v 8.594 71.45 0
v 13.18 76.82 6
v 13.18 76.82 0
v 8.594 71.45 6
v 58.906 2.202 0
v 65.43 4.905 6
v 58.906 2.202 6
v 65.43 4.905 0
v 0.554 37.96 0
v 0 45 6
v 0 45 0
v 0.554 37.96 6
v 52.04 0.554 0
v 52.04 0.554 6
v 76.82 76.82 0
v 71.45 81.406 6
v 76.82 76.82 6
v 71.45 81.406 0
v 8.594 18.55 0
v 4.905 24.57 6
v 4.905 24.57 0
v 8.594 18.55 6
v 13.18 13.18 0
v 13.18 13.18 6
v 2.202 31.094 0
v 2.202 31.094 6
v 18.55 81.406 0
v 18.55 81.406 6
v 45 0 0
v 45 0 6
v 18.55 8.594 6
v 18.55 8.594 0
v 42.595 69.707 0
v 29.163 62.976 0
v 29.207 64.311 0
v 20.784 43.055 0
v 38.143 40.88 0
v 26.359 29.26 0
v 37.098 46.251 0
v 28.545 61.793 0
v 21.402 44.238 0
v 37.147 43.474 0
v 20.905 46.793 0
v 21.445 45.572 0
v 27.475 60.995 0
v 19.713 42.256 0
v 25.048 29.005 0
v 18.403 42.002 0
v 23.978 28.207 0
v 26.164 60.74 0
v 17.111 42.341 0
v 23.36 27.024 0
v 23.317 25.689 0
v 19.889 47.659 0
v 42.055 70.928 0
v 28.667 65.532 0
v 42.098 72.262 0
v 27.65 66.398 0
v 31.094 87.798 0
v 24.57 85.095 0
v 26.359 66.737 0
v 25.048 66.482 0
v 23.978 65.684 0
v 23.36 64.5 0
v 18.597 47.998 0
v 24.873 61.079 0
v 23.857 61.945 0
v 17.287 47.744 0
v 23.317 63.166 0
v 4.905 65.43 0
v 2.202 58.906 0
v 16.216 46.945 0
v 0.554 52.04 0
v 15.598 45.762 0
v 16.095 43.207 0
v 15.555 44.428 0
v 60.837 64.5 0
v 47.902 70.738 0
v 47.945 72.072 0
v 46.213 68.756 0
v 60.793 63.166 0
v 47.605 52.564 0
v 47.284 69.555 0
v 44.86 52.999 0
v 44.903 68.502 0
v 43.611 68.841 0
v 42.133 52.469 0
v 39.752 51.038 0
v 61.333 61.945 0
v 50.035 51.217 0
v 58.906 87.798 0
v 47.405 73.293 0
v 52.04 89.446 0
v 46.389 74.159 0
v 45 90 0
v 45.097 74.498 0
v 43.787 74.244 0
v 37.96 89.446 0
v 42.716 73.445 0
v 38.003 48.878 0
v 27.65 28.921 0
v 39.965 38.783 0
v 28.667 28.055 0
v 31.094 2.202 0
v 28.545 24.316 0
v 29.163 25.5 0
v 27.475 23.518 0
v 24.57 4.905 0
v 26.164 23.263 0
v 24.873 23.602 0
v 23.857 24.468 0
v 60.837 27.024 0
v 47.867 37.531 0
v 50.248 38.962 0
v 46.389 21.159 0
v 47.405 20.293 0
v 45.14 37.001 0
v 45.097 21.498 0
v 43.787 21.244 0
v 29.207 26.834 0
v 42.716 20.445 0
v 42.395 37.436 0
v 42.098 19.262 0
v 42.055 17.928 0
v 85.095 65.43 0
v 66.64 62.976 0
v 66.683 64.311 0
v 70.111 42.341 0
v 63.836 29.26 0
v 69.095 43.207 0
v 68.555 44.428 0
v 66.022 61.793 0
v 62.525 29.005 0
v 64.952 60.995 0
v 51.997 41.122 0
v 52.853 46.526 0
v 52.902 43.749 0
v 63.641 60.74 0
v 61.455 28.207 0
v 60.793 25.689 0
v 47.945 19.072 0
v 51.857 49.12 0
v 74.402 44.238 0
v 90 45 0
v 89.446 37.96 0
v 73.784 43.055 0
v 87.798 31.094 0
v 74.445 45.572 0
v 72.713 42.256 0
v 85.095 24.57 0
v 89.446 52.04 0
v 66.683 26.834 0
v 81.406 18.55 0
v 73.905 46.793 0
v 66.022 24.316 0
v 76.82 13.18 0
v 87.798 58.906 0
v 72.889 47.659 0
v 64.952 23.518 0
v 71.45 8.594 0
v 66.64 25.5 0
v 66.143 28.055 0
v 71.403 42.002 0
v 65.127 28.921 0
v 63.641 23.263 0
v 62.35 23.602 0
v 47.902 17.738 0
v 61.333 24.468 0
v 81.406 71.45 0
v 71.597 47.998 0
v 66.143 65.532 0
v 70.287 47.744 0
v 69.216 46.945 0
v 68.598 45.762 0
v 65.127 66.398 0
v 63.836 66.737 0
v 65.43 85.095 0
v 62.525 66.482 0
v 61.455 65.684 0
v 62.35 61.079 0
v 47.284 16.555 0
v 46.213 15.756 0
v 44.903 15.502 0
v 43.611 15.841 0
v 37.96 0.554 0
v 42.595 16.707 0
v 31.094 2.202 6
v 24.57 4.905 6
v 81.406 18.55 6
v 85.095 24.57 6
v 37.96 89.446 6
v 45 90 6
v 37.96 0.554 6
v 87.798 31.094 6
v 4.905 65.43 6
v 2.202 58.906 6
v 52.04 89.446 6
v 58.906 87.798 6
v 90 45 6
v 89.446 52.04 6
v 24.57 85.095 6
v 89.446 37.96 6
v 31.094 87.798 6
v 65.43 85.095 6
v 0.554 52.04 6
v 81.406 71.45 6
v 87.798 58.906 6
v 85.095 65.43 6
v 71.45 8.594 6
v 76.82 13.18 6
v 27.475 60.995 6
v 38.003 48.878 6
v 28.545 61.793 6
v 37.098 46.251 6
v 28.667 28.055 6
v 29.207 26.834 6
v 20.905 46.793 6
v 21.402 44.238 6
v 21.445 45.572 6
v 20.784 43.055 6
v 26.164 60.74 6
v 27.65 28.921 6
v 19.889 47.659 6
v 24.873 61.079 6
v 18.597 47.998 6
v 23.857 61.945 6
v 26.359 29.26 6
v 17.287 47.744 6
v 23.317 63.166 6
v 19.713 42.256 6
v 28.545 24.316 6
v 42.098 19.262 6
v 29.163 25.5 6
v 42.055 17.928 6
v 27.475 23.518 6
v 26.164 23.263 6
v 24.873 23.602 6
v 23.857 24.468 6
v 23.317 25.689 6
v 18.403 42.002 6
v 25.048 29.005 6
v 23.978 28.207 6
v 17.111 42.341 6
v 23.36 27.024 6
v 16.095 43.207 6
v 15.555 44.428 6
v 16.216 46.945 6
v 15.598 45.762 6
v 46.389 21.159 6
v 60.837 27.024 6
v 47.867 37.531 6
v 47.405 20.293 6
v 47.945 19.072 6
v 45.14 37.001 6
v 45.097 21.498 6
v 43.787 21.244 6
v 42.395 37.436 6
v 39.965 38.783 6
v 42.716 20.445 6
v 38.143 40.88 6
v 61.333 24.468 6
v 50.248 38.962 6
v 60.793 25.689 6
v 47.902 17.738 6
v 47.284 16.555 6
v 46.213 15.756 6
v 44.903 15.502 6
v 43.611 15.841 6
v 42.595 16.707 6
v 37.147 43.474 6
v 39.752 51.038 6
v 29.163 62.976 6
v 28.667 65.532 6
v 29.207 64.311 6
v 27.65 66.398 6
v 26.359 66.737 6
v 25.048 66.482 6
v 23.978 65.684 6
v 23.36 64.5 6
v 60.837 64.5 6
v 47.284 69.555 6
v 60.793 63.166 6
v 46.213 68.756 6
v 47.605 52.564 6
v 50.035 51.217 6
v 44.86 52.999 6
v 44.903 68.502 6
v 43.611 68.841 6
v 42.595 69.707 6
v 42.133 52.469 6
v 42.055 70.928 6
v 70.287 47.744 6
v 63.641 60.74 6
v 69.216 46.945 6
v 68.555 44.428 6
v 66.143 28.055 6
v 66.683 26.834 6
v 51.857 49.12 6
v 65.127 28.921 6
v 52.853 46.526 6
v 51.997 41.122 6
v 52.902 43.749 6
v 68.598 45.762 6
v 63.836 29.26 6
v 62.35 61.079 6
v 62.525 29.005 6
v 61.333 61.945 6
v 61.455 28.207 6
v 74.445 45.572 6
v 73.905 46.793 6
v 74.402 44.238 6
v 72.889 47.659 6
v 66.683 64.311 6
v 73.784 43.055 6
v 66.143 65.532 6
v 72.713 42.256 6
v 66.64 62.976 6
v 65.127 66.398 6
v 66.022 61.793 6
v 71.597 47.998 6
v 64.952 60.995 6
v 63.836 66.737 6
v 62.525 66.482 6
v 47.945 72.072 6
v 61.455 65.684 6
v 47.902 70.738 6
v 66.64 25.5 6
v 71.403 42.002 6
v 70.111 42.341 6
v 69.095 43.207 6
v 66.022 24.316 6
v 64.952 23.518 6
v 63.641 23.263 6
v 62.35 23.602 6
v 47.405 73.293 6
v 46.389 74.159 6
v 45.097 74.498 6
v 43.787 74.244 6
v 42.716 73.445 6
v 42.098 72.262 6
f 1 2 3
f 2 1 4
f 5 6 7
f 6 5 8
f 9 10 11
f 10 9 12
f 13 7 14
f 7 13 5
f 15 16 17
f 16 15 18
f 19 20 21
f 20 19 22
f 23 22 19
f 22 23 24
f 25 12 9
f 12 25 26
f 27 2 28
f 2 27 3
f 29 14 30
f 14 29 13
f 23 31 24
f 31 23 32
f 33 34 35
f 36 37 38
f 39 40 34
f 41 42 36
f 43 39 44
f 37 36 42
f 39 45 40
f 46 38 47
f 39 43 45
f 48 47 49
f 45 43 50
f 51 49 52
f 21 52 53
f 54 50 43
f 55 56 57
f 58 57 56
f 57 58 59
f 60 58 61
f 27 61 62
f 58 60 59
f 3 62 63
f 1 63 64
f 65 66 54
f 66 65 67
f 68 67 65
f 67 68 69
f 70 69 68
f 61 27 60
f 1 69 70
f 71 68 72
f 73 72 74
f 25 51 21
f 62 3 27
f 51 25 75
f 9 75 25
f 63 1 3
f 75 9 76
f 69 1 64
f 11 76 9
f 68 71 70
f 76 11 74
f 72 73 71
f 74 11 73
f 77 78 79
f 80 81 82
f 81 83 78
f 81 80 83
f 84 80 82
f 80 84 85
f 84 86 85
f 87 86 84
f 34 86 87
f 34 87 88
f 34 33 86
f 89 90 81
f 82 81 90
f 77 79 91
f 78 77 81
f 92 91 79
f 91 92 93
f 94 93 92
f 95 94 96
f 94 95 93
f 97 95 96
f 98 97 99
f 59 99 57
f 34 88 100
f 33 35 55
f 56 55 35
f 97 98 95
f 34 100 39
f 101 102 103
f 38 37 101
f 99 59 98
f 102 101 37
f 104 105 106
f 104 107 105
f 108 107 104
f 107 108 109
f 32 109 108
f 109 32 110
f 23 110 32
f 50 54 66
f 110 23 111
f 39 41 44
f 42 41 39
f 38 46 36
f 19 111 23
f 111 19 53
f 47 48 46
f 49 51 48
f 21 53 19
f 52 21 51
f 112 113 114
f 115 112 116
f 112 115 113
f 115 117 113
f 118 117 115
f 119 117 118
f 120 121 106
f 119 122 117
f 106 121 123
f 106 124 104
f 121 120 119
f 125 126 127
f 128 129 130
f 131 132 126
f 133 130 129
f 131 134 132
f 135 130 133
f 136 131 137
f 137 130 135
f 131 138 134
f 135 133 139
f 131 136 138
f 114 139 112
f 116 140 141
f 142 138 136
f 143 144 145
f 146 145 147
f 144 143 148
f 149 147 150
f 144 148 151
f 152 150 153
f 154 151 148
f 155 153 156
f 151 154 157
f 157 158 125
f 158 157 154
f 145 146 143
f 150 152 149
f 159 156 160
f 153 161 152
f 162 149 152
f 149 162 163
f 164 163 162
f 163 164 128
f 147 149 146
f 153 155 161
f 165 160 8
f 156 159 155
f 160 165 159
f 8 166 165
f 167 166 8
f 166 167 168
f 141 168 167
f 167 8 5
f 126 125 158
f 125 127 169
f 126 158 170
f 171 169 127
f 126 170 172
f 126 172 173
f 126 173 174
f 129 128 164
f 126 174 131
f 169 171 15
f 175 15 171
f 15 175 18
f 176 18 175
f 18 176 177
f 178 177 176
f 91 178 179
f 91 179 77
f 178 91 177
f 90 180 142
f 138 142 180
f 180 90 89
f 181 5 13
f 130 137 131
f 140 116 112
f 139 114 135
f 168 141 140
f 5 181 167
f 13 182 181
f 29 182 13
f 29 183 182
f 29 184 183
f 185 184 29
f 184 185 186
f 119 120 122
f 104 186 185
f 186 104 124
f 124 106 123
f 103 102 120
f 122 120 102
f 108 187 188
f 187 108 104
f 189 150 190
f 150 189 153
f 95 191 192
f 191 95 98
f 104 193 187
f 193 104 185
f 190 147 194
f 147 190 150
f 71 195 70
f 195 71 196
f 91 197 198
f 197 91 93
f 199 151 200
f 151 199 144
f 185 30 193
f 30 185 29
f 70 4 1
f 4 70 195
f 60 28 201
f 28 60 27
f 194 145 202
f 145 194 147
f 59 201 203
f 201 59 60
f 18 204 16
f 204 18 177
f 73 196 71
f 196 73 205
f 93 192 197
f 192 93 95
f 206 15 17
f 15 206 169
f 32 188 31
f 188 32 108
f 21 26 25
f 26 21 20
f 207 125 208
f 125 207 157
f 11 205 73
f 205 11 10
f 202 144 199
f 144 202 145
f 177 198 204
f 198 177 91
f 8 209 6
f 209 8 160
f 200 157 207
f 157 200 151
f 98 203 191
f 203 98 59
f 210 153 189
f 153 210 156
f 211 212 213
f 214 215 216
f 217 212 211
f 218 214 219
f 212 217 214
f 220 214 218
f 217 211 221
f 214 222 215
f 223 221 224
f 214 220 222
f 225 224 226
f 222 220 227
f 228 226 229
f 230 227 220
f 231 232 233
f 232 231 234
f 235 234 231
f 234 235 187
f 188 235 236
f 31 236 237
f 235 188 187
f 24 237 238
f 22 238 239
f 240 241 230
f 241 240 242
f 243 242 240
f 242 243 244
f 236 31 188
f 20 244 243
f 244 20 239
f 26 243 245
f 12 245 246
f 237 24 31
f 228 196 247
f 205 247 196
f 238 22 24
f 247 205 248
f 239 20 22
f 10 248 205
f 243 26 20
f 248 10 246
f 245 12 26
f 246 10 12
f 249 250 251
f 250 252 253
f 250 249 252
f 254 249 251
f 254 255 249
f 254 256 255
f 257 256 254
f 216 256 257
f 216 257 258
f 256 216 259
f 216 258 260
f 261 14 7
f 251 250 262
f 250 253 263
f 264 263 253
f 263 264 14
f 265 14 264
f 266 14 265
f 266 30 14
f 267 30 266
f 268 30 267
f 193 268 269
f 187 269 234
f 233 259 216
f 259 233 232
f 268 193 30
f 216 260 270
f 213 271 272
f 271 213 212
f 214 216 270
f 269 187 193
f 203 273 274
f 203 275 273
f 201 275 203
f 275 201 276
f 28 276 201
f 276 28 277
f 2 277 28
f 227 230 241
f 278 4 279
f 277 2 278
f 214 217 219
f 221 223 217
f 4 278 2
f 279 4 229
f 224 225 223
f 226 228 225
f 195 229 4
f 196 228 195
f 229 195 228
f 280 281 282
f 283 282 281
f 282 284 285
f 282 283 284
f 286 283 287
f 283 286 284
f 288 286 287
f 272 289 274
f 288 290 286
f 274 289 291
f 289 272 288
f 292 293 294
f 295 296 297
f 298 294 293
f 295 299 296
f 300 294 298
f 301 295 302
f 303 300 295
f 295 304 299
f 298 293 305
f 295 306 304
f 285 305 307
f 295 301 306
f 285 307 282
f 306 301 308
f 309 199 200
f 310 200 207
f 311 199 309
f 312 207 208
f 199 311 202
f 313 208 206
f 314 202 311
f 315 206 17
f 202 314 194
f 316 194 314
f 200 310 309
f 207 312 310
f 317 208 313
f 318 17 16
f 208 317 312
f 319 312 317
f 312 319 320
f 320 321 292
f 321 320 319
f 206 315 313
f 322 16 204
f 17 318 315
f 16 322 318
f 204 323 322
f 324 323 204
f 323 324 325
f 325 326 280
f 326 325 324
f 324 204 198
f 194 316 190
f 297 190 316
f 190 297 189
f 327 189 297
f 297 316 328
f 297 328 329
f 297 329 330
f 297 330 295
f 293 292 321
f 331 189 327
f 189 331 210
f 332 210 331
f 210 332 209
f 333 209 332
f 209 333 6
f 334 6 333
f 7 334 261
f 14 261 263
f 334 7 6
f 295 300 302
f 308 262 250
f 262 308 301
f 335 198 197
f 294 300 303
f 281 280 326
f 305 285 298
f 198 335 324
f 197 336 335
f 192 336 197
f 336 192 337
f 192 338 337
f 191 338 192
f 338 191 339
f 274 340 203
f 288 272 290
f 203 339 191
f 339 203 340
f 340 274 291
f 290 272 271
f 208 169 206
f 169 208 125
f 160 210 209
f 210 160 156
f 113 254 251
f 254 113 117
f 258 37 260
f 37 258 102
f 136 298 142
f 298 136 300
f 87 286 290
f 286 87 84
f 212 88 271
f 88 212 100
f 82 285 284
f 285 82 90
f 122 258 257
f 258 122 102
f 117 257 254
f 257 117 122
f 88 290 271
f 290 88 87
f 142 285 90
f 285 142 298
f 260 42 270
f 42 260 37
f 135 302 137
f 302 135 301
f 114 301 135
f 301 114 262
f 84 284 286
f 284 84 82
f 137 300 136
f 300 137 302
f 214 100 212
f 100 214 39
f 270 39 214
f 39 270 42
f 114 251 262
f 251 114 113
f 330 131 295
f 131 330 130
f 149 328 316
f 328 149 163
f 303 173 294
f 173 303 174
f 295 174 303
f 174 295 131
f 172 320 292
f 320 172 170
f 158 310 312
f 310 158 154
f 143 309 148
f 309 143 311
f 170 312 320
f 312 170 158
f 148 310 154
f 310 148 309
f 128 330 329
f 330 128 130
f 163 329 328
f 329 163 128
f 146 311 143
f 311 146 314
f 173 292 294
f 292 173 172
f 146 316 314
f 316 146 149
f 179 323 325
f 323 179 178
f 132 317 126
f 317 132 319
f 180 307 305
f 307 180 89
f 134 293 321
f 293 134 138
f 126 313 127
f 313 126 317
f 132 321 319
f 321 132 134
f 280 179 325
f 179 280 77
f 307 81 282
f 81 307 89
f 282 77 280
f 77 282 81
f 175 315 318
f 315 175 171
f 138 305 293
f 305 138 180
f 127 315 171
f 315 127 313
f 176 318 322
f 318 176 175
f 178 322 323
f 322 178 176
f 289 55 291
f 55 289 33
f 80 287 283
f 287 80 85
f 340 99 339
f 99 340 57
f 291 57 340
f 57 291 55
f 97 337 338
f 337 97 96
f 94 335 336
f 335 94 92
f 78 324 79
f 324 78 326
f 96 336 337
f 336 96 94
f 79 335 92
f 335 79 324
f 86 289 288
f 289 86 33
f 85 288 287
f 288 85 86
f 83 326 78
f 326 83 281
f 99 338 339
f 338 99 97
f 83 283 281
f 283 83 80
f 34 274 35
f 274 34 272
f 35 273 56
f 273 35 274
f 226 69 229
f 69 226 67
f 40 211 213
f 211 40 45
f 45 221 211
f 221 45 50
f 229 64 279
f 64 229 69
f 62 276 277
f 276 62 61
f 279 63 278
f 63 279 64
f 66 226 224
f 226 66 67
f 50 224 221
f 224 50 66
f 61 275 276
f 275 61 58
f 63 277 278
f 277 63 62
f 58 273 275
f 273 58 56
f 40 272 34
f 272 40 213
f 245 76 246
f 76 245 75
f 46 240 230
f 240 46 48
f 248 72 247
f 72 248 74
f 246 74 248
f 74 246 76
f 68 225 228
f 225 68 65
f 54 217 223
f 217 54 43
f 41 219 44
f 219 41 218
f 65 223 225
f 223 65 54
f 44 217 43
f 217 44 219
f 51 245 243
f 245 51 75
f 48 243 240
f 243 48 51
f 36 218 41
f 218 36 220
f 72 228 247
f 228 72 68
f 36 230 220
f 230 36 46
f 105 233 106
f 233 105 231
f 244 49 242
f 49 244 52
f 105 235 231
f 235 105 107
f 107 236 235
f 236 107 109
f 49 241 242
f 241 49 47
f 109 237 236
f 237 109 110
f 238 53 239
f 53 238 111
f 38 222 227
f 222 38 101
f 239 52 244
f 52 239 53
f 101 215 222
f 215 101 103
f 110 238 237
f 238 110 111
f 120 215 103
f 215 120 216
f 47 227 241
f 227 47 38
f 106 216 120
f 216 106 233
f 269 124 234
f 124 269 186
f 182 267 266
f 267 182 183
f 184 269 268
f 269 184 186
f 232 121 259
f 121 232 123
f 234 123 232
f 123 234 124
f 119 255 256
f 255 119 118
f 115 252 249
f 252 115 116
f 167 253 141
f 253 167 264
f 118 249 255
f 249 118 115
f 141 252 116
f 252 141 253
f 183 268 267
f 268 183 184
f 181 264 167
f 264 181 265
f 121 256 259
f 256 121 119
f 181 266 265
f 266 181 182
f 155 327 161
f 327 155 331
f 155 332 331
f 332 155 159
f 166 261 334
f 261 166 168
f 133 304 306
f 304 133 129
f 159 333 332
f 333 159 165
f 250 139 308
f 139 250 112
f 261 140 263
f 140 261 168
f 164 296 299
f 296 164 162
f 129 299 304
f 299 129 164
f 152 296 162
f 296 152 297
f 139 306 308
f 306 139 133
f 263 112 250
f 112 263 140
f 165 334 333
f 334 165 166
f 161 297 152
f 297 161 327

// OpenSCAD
$fn = 32;

// ----------------------------------------------------------------------
// Spacer plate: round flange R45, 8 bolts
// ----------------------------------------------------------------------

// --- parameters (mm) ---
bore_r = 8;               // centre bore radius
bolt_r = 3;               // bolt hole radius
plate_t = 6;              // plate thickness, Z (extrusion height)
flange_r = 45;            // flange radius
n_bolt = 8;               // bolt hole count
ring_r = 26.5;            // bolt circle radius

profile = [[90, 45], [89.446, 52.04], [87.798, 58.906], [85.095, 65.43], [81.406, 71.45], [76.82, 76.82], [71.45, 81.406], [65.43, 85.095], [58.906, 87.798], [52.04, 89.446], [45, 90], [37.96, 89.446], [31.094, 87.798], [24.57, 85.095], [18.55, 81.406], [13.18, 76.82], [8.594, 71.45], [4.905, 65.43], [2.202, 58.906], [0.554, 52.04], [0, 45], [0.554, 37.96], [2.202, 31.094], [4.905, 24.57], [8.594, 18.55], [13.18, 13.18], [18.55, 8.594], [24.57, 4.905], [31.094, 2.202], [37.96, 0.554], [45, 0], [52.04, 0.554], [58.906, 2.202], [65.43, 4.905], [71.45, 8.594], [76.82, 13.18], [81.406, 18.55], [85.095, 24.57], [87.798, 31.094], [89.446, 37.96]];  // primary outline, 40 points, counter clockwise
void_1 = [[52.853, 46.526], [51.857, 49.12], [50.035, 51.217], [47.605, 52.564], [44.86, 52.999], [42.133, 52.469], [39.752, 51.038], [38.003, 48.878], [37.098, 46.251], [37.147, 43.474], [38.143, 40.88], [39.965, 38.783], [42.395, 37.436], [45.14, 37.001], [47.867, 37.531], [50.248, 38.962], [51.997, 41.122], [52.902, 43.749]];  // centre bore, 18 points
void_2 = [[74.445, 45.572], [73.905, 46.793], [72.889, 47.659], [71.597, 47.998], [70.287, 47.744], [69.216, 46.945], [68.598, 45.762], [68.555, 44.428], [69.095, 43.207], [70.111, 42.341], [71.403, 42.002], [72.713, 42.256], [73.784, 43.055], [74.402, 44.238]];  // bolt hole 1, 14 points
void_3 = [[66.683, 64.311], [66.143, 65.532], [65.127, 66.398], [63.836, 66.737], [62.525, 66.482], [61.455, 65.684], [60.837, 64.5], [60.793, 63.166], [61.333, 61.945], [62.35, 61.079], [63.641, 60.74], [64.952, 60.995], [66.022, 61.793], [66.64, 62.976]];  // bolt hole 2, 14 points
void_4 = [[47.945, 72.072], [47.405, 73.293], [46.389, 74.159], [45.097, 74.498], [43.787, 74.244], [42.716, 73.445], [42.098, 72.262], [42.055, 70.928], [42.595, 69.707], [43.611, 68.841], [44.903, 68.502], [46.213, 68.756], [47.284, 69.555], [47.902, 70.738]];  // bolt hole 3, 14 points
void_5 = [[29.207, 64.311], [28.667, 65.532], [27.65, 66.398], [26.359, 66.737], [25.048, 66.482], [23.978, 65.684], [23.36, 64.5], [23.317, 63.166], [23.857, 61.945], [24.873, 61.079], [26.164, 60.74], [27.475, 60.995], [28.545, 61.793], [29.163, 62.976]];  // bolt hole 4, 14 points
void_6 = [[21.445, 45.572], [20.905, 46.793], [19.889, 47.659], [18.597, 47.998], [17.287, 47.744], [16.216, 46.945], [15.598, 45.762], [15.555, 44.428], [16.095, 43.207], [17.111, 42.341], [18.403, 42.002], [19.713, 42.256], [20.784, 43.055], [21.402, 44.238]];  // bolt hole 5, 14 points
void_7 = [[29.207, 26.834], [28.667, 28.055], [27.65, 28.921], [26.359, 29.26], [25.048, 29.005], [23.978, 28.207], [23.36, 27.024], [23.317, 25.689], [23.857, 24.468], [24.873, 23.602], [26.164, 23.263], [27.475, 23.518], [28.545, 24.316], [29.163, 25.5]];  // bolt hole 6, 14 points
void_8 = [[47.945, 19.072], [47.405, 20.293], [46.389, 21.159], [45.097, 21.498], [43.787, 21.244], [42.716, 20.445], [42.098, 19.262], [42.055, 17.928], [42.595, 16.707], [43.611, 15.841], [44.903, 15.502], [46.213, 15.756], [47.284, 16.555], [47.902, 17.738]];  // bolt hole 7, 14 points
void_9 = [[66.683, 26.834], [66.143, 28.055], [65.127, 28.921], [63.836, 29.26], [62.525, 29.005], [61.455, 28.207], [60.837, 27.024], [60.793, 25.689], [61.333, 24.468], [62.35, 23.602], [63.641, 23.263], [64.952, 23.518], [66.022, 24.316], [66.64, 25.5]];  // bolt hole 8, 14 points

// --- the one profile operation ---
difference() {
  linear_extrude(height = plate_t) polygon(points = profile);
  translate([0, 0, -1])
    linear_extrude(height = plate_t + 2) polygon(points = void_1);
  translate([0, 0, -1])
    linear_extrude(height = plate_t + 2) polygon(points = void_2);
  translate([0, 0, -1])
    linear_extrude(height = plate_t + 2) polygon(points = void_3);
  translate([0, 0, -1])
    linear_extrude(height = plate_t + 2) polygon(points = void_4);
  translate([0, 0, -1])
    linear_extrude(height = plate_t + 2) polygon(points = void_5);
  translate([0, 0, -1])
    linear_extrude(height = plate_t + 2) polygon(points = void_6);
  translate([0, 0, -1])
    linear_extrude(height = plate_t + 2) polygon(points = void_7);
  translate([0, 0, -1])
    linear_extrude(height = plate_t + 2) polygon(points = void_8);
  translate([0, 0, -1])
    linear_extrude(height = plate_t + 2) polygon(points = void_9);
}
